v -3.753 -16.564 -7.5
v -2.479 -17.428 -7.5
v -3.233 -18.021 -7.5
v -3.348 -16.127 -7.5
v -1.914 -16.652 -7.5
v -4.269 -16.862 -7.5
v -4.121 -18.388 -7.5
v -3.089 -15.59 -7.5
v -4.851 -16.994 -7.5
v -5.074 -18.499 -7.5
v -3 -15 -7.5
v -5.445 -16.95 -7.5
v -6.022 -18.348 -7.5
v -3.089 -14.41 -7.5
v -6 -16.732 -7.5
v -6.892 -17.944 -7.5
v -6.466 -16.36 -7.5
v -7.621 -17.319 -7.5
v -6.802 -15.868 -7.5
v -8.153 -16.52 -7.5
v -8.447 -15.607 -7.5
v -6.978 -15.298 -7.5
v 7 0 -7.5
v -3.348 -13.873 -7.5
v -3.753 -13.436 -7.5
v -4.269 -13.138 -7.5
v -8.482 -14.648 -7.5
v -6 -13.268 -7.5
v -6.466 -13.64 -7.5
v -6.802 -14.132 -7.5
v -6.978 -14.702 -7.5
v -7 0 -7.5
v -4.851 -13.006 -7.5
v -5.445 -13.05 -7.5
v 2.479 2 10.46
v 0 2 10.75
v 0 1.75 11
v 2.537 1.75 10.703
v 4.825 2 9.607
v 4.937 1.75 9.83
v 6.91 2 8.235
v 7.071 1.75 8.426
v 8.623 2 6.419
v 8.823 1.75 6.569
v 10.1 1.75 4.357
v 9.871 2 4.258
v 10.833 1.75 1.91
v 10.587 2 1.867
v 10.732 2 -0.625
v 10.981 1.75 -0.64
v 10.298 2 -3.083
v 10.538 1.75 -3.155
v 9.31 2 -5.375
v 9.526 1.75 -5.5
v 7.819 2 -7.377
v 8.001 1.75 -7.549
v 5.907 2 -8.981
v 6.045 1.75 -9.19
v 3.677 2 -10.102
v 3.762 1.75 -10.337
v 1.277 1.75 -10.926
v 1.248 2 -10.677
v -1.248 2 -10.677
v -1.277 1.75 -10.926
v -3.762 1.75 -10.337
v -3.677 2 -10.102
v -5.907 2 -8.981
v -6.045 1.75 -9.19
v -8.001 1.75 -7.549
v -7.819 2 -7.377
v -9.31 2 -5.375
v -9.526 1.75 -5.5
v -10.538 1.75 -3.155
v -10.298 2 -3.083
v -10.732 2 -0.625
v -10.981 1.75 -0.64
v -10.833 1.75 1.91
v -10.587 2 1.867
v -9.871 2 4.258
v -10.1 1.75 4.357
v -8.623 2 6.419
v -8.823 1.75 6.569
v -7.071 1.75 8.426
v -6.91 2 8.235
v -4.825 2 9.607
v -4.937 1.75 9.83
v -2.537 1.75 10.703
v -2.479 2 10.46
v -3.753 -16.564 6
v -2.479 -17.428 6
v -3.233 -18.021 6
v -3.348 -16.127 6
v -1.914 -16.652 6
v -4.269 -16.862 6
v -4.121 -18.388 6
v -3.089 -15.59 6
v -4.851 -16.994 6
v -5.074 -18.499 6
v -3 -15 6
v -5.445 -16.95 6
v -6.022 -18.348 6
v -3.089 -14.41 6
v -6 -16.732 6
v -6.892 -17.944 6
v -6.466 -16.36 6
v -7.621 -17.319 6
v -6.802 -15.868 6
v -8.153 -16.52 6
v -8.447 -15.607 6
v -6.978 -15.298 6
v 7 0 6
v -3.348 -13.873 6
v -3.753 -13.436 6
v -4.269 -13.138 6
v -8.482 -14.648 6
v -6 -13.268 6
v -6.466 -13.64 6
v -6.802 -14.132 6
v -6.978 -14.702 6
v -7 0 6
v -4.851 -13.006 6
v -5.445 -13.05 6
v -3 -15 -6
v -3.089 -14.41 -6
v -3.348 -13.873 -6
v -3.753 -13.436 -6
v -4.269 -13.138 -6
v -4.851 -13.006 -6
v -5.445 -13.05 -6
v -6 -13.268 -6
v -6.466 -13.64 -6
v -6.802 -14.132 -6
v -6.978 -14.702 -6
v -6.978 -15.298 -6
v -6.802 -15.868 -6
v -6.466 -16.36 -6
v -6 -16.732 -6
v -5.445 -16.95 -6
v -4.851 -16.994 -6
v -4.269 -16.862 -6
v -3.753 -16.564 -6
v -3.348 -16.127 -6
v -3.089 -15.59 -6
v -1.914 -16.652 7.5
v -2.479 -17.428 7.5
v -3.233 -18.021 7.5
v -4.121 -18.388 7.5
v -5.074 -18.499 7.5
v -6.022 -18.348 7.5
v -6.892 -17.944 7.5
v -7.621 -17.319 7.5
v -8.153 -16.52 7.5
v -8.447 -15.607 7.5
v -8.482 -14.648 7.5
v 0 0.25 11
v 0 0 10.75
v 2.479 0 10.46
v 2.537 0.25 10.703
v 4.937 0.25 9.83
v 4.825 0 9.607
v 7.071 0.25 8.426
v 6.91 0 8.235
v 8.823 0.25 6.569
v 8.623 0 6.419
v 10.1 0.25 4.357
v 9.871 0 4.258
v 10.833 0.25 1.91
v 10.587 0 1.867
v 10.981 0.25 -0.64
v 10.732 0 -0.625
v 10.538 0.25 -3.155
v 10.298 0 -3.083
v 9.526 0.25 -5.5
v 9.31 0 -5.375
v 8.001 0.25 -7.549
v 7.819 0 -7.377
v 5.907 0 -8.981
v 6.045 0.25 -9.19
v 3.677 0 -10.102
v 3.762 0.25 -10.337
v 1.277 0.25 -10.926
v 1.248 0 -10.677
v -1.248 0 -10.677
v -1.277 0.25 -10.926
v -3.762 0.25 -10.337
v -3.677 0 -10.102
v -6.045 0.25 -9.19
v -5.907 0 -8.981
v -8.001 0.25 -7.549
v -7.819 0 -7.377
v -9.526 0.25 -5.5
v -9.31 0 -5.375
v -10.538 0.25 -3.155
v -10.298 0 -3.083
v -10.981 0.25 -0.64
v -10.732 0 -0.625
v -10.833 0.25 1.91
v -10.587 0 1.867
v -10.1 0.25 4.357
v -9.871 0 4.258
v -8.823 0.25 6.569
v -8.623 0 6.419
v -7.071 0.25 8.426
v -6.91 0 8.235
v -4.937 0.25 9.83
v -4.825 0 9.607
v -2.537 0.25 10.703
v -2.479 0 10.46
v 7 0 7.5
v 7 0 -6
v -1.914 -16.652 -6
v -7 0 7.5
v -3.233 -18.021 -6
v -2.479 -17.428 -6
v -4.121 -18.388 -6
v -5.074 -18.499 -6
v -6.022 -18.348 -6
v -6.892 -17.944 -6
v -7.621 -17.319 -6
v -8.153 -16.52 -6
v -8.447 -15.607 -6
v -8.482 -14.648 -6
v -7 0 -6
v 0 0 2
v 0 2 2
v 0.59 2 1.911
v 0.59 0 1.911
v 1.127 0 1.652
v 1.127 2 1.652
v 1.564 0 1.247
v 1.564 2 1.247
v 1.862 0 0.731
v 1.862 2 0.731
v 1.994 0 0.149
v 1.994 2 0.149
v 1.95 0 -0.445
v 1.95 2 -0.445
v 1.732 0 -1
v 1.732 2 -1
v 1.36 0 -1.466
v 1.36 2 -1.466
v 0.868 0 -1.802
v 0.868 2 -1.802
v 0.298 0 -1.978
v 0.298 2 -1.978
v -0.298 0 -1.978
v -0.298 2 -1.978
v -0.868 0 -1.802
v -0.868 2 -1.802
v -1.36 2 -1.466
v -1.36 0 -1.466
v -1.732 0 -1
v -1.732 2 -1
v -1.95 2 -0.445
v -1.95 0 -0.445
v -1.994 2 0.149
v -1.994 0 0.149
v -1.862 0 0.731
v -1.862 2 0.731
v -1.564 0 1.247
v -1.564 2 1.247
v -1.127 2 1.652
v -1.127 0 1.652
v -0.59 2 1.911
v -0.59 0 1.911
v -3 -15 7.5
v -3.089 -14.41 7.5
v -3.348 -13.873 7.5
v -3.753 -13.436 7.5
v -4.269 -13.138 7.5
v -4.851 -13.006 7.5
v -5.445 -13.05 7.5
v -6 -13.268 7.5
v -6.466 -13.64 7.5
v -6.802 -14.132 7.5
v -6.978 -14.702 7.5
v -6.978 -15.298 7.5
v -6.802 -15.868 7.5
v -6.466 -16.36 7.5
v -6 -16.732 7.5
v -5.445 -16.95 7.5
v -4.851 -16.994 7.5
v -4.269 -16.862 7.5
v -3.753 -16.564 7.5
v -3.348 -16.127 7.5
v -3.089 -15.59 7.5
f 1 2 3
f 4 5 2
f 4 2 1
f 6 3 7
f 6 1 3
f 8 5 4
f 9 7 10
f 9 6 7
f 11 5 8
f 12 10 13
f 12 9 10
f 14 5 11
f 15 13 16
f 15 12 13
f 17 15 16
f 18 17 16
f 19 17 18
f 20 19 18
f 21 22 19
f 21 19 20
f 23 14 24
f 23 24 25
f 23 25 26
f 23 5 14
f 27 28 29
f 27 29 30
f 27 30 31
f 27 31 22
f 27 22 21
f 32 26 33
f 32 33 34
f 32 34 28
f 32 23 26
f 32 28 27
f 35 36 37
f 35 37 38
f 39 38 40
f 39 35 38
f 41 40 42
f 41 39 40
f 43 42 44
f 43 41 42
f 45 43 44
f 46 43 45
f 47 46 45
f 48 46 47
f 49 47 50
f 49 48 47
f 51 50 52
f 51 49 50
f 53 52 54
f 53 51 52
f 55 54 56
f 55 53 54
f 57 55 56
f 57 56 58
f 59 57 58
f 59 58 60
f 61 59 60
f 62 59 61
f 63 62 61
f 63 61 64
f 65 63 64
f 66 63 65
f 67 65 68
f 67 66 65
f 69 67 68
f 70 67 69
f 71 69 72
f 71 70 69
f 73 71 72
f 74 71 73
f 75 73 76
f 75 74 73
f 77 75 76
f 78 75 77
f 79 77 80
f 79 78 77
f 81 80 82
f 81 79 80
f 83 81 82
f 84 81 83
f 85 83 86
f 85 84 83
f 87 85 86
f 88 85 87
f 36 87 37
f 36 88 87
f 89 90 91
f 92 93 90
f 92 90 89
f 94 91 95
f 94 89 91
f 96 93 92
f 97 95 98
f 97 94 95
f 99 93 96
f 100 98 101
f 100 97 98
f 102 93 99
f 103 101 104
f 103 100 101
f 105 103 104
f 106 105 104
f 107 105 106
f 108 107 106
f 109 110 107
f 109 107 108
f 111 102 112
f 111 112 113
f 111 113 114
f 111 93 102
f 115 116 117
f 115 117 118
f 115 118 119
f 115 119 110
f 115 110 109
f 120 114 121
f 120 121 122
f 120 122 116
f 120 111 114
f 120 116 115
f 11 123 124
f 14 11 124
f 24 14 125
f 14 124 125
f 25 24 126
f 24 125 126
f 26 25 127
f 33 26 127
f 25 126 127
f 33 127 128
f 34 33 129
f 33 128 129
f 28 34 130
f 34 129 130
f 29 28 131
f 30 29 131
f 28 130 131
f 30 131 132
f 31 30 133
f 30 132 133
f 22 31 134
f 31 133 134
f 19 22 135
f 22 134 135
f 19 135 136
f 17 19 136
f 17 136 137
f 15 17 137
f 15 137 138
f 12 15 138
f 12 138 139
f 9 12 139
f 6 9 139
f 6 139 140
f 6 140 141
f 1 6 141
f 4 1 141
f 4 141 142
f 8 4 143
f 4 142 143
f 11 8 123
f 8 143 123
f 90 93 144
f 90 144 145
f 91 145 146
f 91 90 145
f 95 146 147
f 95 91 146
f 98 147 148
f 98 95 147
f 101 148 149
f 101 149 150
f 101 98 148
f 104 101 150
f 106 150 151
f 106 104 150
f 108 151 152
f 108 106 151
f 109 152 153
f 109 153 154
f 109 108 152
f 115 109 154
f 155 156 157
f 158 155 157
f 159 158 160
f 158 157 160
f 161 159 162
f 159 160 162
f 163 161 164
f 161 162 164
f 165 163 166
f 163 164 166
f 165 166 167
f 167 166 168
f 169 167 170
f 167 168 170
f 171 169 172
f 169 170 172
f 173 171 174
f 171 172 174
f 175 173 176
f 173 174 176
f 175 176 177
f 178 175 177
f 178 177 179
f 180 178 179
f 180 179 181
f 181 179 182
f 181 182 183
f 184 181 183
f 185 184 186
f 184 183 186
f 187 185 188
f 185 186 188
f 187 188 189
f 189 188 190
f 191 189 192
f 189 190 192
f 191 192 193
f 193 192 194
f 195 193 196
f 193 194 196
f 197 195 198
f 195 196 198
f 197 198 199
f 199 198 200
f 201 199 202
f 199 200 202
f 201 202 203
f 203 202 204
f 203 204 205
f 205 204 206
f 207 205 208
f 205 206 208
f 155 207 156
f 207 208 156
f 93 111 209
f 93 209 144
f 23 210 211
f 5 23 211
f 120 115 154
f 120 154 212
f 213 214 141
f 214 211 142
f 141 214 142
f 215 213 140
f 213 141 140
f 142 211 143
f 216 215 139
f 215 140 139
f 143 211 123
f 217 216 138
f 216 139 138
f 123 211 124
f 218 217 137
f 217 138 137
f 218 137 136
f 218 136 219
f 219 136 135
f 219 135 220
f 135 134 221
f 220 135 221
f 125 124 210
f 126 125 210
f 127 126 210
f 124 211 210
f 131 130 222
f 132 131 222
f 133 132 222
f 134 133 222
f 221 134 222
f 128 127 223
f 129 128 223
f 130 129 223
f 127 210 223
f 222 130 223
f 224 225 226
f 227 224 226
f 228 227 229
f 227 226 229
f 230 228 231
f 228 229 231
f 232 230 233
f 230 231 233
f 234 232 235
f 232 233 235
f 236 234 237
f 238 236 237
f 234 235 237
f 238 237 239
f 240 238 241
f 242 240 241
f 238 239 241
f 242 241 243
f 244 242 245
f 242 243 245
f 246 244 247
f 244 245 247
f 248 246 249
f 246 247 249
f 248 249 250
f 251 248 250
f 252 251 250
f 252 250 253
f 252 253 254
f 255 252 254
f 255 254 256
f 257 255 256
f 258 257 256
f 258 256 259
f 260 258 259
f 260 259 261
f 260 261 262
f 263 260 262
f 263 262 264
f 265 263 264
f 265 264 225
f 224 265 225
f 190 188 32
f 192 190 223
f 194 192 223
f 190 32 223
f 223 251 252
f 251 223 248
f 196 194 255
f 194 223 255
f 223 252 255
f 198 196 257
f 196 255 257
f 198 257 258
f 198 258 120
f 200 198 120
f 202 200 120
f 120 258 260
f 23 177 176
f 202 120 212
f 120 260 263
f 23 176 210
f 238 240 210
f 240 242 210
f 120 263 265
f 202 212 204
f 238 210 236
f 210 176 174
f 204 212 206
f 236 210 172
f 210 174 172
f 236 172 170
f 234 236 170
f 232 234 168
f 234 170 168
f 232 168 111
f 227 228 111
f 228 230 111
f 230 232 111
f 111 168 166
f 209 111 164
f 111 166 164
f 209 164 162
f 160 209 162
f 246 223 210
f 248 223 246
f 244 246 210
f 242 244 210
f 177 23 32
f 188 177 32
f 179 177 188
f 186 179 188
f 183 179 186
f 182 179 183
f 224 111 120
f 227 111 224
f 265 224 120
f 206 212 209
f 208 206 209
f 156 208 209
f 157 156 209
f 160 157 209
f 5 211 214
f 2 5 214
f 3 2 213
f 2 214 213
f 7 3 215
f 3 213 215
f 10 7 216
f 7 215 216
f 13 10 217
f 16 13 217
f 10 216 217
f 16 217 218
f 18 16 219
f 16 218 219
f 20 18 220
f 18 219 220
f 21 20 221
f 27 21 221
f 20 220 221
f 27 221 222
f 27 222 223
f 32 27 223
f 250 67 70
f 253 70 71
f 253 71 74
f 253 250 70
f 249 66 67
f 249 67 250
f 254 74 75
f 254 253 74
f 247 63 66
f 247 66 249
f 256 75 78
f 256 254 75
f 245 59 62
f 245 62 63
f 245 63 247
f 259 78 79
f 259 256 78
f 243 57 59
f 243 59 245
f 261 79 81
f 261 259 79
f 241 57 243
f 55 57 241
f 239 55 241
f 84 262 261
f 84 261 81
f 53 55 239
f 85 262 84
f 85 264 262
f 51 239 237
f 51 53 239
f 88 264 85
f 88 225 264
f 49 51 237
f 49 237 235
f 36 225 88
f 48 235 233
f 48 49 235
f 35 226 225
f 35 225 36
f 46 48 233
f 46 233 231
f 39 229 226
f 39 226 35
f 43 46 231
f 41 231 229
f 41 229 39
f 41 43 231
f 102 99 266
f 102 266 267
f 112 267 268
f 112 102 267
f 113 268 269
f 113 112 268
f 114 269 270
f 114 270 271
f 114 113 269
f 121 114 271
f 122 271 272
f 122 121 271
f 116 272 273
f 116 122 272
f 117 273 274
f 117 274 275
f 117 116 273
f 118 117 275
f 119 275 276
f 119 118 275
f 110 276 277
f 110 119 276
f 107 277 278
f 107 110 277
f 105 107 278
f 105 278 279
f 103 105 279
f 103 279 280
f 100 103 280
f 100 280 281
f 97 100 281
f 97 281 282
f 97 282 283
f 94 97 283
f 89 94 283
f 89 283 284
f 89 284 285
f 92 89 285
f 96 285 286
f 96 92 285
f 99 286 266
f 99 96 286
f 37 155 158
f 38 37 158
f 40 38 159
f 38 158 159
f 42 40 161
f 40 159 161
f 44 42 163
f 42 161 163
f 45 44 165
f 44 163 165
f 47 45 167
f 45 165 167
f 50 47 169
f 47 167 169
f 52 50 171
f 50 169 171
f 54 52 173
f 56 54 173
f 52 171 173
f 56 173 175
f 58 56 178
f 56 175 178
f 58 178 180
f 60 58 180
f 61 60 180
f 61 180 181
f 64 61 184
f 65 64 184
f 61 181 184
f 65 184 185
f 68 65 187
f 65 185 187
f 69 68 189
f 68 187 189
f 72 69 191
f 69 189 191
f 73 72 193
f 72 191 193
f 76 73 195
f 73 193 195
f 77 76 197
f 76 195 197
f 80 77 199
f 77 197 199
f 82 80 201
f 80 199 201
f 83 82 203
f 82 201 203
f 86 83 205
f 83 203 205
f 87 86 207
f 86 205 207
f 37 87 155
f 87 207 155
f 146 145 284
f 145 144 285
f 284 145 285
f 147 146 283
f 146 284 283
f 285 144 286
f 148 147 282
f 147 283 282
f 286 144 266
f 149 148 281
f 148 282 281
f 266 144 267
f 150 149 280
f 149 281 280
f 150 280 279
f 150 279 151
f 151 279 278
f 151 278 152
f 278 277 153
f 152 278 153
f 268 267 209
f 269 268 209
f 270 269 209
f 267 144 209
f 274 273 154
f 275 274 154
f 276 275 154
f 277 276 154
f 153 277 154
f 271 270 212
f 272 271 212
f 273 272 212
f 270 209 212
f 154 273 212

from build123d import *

# Parameters (mm, degrees)
SKETCH6_R           = 11
BOSS_EXTRUDE3_DEPTH = 2
CHAMFER3_SIZE       = 0.25
SKETCH7_R           = 2
BOSS_EXTRUDE4_DEPTH = 1.5
SKETCH8_R           = 2
CUT_EXTRUDE1_DEPTH  = 26.734218465


with BuildPart() as part:
    # Sketch6 → Boss-Extrude3 (new body)
    with BuildSketch(Plane(origin=(0, 0, 0), x_dir=(1, 0, 0), z_dir=(0, 1, 0))):
        with Locations(Location((0, 0, 0), (0, 0, 270))):
            Circle(SKETCH6_R)
    extrude(amount=BOSS_EXTRUDE3_DEPTH)

    # Chamfer3
    chamfer3_edges = [part.edges().sort_by_distance(p)[0] for p in [
        (0, 0, -11),
        (0, 2, -11),
    ]]
    chamfer(chamfer3_edges, length=CHAMFER3_SIZE)

    # Sketch7 → Boss-Extrude4 (add)
    with BuildSketch(Plane.XY.offset(6)):
        with BuildLine():
            Line((-7, 0), (7, 0))
            Line((7, 0), (-1.91433359, -16.651866461))
            ThreePointArc((-1.91433359, -16.651866461), (-6.021545449, -18.347602858), (-8.482216912, -14.647628922))
            Line((-8.482216912, -14.647628922), (-7, 0))
        make_face()
        with Locations((-5, -15)):
            Circle(SKETCH7_R, mode=Mode.SUBTRACT)
    boss_extrude4 = extrude(amount=BOSS_EXTRUDE4_DEPTH)

    # Mirror2: Boss-Extrude4 across plane
    add(boss_extrude4.mirror(Plane.XY))

    # Sketch8 → Cut-Extrude1 (cut, through all)
    with BuildSketch(Plane(origin=(0, 2, 0), x_dir=(1, 0, 0), z_dir=(0, 1, 0))):
        with Locations(Location((0, 0, 0), (0, 0, 270))):
            Circle(SKETCH8_R)
    extrude(amount=-CUT_EXTRUDE1_DEPTH, mode=Mode.SUBTRACT)


solid = part.part
